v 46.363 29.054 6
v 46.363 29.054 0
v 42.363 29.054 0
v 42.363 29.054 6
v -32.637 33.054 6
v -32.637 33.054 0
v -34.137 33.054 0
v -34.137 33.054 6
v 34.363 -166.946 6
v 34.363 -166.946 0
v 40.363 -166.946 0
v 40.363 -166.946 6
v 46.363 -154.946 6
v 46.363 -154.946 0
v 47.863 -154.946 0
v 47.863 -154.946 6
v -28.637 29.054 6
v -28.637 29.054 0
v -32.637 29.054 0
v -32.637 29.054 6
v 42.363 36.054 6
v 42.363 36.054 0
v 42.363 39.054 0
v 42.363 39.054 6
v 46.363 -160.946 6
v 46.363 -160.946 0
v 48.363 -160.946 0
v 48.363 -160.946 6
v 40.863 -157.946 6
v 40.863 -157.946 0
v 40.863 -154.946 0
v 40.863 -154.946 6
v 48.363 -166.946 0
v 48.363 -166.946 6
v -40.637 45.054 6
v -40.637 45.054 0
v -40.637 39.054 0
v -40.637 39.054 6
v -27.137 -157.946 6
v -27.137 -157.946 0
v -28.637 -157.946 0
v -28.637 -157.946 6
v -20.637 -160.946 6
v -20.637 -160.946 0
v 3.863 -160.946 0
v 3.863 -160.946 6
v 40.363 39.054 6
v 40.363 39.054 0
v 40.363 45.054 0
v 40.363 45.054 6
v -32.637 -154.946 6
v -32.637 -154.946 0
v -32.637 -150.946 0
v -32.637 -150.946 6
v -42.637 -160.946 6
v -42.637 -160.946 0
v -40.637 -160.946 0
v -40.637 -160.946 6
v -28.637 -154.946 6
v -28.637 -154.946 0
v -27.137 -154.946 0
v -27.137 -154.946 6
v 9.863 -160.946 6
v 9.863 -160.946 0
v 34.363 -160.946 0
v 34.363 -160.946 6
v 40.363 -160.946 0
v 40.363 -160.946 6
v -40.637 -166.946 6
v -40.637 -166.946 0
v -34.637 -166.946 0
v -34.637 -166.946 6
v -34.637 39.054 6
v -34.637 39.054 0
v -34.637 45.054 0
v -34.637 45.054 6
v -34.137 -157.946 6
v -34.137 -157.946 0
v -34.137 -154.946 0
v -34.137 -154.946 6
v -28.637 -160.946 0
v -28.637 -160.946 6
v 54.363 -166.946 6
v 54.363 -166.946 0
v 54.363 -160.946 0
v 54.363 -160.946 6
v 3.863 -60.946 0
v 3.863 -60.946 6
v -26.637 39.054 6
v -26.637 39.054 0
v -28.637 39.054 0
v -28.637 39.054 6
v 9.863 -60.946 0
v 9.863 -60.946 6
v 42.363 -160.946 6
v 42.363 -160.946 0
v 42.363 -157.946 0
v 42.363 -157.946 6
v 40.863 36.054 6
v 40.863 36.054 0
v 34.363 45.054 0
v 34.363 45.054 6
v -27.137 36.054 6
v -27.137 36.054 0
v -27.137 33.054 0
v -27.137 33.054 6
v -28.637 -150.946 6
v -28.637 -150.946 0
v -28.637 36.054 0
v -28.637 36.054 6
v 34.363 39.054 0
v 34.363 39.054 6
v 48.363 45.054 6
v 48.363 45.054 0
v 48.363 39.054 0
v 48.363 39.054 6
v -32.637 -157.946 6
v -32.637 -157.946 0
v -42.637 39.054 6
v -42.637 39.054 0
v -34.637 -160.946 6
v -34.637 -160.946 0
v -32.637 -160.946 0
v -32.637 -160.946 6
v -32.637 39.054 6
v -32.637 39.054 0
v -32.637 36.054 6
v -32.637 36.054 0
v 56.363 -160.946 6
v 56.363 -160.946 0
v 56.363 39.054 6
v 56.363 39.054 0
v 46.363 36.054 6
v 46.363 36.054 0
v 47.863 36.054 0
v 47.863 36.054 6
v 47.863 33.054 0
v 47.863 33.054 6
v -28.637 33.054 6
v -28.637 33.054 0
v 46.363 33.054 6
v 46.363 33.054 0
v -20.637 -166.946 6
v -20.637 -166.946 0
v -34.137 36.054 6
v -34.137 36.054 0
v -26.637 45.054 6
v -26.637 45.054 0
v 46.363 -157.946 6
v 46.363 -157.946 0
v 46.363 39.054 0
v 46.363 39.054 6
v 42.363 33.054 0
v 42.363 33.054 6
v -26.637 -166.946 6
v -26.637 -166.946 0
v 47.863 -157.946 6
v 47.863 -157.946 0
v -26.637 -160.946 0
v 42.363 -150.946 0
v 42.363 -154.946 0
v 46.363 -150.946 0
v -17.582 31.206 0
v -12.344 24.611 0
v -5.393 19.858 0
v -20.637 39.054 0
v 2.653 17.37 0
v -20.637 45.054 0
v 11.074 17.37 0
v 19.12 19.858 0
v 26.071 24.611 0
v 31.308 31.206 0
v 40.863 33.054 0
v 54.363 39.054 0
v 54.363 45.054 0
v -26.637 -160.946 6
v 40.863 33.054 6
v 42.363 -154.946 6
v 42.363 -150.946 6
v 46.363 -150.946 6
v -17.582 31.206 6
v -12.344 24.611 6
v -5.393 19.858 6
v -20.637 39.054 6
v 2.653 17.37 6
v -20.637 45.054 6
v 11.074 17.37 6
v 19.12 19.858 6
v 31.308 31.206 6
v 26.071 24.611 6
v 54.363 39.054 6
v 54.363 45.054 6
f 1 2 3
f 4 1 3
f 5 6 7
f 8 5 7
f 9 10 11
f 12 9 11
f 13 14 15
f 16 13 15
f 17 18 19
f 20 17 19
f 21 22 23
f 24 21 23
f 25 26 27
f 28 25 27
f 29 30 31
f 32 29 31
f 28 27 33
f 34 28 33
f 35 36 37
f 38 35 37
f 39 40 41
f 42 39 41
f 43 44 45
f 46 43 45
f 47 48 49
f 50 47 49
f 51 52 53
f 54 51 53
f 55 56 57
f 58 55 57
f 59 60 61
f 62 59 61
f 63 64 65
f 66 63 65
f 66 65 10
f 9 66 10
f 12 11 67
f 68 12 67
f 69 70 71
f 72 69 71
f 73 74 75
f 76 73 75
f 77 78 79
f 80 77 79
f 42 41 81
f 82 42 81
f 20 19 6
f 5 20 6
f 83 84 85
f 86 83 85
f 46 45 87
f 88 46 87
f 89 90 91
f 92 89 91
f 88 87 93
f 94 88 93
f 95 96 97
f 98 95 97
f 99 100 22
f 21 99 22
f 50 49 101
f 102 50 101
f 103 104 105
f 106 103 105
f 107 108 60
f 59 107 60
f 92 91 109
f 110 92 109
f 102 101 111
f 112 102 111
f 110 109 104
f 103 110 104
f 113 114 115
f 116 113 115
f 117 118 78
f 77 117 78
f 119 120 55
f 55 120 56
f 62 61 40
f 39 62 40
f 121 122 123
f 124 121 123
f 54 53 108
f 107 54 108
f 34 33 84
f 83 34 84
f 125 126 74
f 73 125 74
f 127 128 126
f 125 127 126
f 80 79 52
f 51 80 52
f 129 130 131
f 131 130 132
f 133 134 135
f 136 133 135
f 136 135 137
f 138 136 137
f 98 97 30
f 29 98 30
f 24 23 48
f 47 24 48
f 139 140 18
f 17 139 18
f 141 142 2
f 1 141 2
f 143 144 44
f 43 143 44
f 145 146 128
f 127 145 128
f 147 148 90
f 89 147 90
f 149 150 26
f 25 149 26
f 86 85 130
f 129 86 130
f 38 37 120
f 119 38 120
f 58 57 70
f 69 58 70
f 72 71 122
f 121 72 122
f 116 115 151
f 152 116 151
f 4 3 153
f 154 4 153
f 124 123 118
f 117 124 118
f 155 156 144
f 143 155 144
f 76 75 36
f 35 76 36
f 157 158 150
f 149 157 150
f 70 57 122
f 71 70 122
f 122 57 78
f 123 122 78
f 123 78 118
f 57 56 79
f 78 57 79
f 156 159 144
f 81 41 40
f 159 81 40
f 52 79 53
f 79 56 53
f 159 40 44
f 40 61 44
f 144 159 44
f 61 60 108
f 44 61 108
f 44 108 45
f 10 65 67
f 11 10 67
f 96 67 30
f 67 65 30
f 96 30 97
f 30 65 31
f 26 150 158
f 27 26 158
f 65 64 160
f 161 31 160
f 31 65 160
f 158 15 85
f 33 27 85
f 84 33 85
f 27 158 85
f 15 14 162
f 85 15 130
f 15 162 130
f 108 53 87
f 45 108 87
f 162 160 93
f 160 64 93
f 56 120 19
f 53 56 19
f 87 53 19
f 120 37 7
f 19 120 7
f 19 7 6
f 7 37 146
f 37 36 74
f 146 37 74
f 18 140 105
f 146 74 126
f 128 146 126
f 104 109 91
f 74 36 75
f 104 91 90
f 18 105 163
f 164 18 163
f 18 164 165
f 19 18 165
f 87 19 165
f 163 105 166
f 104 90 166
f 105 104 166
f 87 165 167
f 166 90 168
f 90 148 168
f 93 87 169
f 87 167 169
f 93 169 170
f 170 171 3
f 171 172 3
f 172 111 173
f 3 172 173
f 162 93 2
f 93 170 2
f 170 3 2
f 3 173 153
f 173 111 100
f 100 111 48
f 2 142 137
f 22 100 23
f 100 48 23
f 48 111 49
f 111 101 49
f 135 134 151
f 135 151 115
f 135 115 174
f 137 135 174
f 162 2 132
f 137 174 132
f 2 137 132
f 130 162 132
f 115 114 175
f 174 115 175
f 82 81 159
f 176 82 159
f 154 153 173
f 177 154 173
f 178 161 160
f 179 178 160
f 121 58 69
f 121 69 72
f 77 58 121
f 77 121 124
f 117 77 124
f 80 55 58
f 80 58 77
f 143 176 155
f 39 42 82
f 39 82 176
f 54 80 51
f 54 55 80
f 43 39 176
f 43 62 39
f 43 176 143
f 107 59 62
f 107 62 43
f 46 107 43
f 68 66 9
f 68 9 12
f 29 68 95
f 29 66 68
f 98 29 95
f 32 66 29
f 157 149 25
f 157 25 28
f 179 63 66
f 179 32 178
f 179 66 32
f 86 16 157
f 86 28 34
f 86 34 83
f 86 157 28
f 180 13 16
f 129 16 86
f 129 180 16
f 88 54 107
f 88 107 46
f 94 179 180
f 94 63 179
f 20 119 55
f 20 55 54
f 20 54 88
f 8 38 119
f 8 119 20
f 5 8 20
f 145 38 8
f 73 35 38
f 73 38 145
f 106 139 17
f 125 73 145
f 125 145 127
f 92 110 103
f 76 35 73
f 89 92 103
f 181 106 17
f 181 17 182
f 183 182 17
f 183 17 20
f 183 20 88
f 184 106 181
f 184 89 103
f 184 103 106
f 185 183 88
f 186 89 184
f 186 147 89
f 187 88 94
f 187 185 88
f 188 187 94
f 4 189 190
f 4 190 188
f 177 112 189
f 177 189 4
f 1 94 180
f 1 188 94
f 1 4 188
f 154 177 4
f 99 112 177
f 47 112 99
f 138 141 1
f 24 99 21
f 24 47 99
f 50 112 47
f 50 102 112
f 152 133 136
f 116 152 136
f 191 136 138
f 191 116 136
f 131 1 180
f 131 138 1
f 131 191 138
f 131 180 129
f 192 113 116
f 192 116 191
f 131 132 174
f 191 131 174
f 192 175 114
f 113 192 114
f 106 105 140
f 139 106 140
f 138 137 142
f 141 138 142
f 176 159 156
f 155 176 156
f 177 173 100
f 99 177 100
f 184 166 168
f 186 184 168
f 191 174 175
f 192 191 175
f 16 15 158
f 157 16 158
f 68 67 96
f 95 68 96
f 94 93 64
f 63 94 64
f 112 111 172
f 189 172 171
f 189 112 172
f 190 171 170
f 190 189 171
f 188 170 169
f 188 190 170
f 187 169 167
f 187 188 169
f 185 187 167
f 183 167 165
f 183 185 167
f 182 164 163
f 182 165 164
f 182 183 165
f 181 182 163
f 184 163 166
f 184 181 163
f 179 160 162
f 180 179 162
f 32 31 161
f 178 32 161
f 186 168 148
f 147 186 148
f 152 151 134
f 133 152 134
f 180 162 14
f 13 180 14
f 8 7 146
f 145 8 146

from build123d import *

# Parameters (mm, degrees)
BOSS_EXTRU_1_DEPTH      = 6
ENL_V_MAT_EXTRU_1_DEPTH = 10


with BuildPart() as part:
    # Esquisse1 → Boss.-Extru.1 (new body)
    with BuildSketch(Plane.XY):
        Polygon((-40.636697438, 45.053641116), (-40.636697438, 39.053641116), (-42.636697438, 39.053641116), (-42.636697438, -160.946358884), (-40.636697438, -160.946358884), (-40.636697438, -166.946358884), (-34.636697438, -166.946358884), (-34.636697438, -160.946358884), (-32.636697438, -160.946358884), (-32.636697438, -157.946358884), (-34.136697438, -157.946358884), (-34.136697438, -154.946358884), (-32.636697438, -154.946358884), (-32.636697438, -150.946358884), (-28.636697438, -150.946358884), (-28.636697438, -154.946358884), (-27.136697438, -154.946358884), (-27.136697438, -157.946358884), (-28.636697438, -157.946358884), (-28.636697438, -160.946358884), (-26.636697438, -160.946358884), (-26.636697438, -166.946358884), (-20.636697438, -166.946358884), (-20.636697438, -160.946358884), (3.863302562, -160.946358884), (3.863302562, -60.946358884), (6.863302562, -60.946358884), (6.863302562, 39.053641116), (-20.636697438, 39.053641116), (-20.636697438, 45.053641116), (-26.636697438, 45.053641116), (-26.636697438, 39.053641116), (-28.636697438, 39.053641116), (-28.636697438, 36.053641116), (-27.136697438, 36.053641116), (-27.136697438, 33.053641116), (-28.636697438, 33.053641116), (-28.636697438, 29.053641116), (-32.636697438, 29.053641116), (-32.636697438, 33.053641116), (-34.136697438, 33.053641116), (-34.136697438, 36.053641116), (-32.636697438, 36.053641116), (-32.636697438, 39.053641116), (-34.636697438, 39.053641116), (-34.636697438, 45.053641116), align=None)
        Polygon((34.363302562, 39.053641116), (6.863302562, 39.053641116), (6.863302562, -60.946358884), (9.863302562, -60.946358884), (9.863302562, -160.946358884), (34.363302562, -160.946358884), (34.363302562, -166.946358884), (40.363302562, -166.946358884), (40.363302562, -160.946358884), (42.363302562, -160.946358884), (42.363302562, -157.946358884), (40.863302562, -157.946358884), (40.863302562, -154.946358884), (42.363302562, -154.946358884), (42.363302562, -150.946358884), (46.363302562, -150.946358884), (46.363302562, -154.946358884), (47.863302562, -154.946358884), (47.863302562, -157.946358884), (46.363302562, -157.946358884), (46.363302562, -160.946358884), (48.363302562, -160.946358884), (48.363302562, -166.946358884), (54.363302562, -166.946358884), (54.363302562, -160.946358884), (56.363302562, -160.946358884), (56.363302562, 39.053641116), (54.363302562, 39.053641116), (54.363302562, 45.053641116), (48.363302562, 45.053641116), (48.363302562, 39.053641116), (46.363302562, 39.053641116), (46.363302562, 36.053641116), (47.863302562, 36.053641116), (47.863302562, 33.053641116), (46.363302562, 33.053641116), (46.363302562, 29.053641116), (42.363302562, 29.053641116), (42.363302562, 33.053641116), (40.863302562, 33.053641116), (40.863302562, 36.053641116), (42.363302562, 36.053641116), (42.363302562, 39.053641116), (40.363302562, 39.053641116), (40.363302562, 45.053641116), (34.363302562, 45.053641116), align=None)
    extrude(amount=BOSS_EXTRU_1_DEPTH)

    # Esquisse2 → Enlèv. mat.-Extru.1 (cut)
    with BuildSketch(Plane.XY.offset(6)):
        with BuildLine():
            Line((-20.636697438, 39.053641116), (34.363302562, 39.053641116))
            ThreePointArc((34.363302562, 39.053641116), (6.863302562, 17.053641116), (-20.636697438, 39.053641116))
        make_face()
    extrude(amount=-ENL_V_MAT_EXTRU_1_DEPTH, mode=Mode.SUBTRACT)


solid = part.part
